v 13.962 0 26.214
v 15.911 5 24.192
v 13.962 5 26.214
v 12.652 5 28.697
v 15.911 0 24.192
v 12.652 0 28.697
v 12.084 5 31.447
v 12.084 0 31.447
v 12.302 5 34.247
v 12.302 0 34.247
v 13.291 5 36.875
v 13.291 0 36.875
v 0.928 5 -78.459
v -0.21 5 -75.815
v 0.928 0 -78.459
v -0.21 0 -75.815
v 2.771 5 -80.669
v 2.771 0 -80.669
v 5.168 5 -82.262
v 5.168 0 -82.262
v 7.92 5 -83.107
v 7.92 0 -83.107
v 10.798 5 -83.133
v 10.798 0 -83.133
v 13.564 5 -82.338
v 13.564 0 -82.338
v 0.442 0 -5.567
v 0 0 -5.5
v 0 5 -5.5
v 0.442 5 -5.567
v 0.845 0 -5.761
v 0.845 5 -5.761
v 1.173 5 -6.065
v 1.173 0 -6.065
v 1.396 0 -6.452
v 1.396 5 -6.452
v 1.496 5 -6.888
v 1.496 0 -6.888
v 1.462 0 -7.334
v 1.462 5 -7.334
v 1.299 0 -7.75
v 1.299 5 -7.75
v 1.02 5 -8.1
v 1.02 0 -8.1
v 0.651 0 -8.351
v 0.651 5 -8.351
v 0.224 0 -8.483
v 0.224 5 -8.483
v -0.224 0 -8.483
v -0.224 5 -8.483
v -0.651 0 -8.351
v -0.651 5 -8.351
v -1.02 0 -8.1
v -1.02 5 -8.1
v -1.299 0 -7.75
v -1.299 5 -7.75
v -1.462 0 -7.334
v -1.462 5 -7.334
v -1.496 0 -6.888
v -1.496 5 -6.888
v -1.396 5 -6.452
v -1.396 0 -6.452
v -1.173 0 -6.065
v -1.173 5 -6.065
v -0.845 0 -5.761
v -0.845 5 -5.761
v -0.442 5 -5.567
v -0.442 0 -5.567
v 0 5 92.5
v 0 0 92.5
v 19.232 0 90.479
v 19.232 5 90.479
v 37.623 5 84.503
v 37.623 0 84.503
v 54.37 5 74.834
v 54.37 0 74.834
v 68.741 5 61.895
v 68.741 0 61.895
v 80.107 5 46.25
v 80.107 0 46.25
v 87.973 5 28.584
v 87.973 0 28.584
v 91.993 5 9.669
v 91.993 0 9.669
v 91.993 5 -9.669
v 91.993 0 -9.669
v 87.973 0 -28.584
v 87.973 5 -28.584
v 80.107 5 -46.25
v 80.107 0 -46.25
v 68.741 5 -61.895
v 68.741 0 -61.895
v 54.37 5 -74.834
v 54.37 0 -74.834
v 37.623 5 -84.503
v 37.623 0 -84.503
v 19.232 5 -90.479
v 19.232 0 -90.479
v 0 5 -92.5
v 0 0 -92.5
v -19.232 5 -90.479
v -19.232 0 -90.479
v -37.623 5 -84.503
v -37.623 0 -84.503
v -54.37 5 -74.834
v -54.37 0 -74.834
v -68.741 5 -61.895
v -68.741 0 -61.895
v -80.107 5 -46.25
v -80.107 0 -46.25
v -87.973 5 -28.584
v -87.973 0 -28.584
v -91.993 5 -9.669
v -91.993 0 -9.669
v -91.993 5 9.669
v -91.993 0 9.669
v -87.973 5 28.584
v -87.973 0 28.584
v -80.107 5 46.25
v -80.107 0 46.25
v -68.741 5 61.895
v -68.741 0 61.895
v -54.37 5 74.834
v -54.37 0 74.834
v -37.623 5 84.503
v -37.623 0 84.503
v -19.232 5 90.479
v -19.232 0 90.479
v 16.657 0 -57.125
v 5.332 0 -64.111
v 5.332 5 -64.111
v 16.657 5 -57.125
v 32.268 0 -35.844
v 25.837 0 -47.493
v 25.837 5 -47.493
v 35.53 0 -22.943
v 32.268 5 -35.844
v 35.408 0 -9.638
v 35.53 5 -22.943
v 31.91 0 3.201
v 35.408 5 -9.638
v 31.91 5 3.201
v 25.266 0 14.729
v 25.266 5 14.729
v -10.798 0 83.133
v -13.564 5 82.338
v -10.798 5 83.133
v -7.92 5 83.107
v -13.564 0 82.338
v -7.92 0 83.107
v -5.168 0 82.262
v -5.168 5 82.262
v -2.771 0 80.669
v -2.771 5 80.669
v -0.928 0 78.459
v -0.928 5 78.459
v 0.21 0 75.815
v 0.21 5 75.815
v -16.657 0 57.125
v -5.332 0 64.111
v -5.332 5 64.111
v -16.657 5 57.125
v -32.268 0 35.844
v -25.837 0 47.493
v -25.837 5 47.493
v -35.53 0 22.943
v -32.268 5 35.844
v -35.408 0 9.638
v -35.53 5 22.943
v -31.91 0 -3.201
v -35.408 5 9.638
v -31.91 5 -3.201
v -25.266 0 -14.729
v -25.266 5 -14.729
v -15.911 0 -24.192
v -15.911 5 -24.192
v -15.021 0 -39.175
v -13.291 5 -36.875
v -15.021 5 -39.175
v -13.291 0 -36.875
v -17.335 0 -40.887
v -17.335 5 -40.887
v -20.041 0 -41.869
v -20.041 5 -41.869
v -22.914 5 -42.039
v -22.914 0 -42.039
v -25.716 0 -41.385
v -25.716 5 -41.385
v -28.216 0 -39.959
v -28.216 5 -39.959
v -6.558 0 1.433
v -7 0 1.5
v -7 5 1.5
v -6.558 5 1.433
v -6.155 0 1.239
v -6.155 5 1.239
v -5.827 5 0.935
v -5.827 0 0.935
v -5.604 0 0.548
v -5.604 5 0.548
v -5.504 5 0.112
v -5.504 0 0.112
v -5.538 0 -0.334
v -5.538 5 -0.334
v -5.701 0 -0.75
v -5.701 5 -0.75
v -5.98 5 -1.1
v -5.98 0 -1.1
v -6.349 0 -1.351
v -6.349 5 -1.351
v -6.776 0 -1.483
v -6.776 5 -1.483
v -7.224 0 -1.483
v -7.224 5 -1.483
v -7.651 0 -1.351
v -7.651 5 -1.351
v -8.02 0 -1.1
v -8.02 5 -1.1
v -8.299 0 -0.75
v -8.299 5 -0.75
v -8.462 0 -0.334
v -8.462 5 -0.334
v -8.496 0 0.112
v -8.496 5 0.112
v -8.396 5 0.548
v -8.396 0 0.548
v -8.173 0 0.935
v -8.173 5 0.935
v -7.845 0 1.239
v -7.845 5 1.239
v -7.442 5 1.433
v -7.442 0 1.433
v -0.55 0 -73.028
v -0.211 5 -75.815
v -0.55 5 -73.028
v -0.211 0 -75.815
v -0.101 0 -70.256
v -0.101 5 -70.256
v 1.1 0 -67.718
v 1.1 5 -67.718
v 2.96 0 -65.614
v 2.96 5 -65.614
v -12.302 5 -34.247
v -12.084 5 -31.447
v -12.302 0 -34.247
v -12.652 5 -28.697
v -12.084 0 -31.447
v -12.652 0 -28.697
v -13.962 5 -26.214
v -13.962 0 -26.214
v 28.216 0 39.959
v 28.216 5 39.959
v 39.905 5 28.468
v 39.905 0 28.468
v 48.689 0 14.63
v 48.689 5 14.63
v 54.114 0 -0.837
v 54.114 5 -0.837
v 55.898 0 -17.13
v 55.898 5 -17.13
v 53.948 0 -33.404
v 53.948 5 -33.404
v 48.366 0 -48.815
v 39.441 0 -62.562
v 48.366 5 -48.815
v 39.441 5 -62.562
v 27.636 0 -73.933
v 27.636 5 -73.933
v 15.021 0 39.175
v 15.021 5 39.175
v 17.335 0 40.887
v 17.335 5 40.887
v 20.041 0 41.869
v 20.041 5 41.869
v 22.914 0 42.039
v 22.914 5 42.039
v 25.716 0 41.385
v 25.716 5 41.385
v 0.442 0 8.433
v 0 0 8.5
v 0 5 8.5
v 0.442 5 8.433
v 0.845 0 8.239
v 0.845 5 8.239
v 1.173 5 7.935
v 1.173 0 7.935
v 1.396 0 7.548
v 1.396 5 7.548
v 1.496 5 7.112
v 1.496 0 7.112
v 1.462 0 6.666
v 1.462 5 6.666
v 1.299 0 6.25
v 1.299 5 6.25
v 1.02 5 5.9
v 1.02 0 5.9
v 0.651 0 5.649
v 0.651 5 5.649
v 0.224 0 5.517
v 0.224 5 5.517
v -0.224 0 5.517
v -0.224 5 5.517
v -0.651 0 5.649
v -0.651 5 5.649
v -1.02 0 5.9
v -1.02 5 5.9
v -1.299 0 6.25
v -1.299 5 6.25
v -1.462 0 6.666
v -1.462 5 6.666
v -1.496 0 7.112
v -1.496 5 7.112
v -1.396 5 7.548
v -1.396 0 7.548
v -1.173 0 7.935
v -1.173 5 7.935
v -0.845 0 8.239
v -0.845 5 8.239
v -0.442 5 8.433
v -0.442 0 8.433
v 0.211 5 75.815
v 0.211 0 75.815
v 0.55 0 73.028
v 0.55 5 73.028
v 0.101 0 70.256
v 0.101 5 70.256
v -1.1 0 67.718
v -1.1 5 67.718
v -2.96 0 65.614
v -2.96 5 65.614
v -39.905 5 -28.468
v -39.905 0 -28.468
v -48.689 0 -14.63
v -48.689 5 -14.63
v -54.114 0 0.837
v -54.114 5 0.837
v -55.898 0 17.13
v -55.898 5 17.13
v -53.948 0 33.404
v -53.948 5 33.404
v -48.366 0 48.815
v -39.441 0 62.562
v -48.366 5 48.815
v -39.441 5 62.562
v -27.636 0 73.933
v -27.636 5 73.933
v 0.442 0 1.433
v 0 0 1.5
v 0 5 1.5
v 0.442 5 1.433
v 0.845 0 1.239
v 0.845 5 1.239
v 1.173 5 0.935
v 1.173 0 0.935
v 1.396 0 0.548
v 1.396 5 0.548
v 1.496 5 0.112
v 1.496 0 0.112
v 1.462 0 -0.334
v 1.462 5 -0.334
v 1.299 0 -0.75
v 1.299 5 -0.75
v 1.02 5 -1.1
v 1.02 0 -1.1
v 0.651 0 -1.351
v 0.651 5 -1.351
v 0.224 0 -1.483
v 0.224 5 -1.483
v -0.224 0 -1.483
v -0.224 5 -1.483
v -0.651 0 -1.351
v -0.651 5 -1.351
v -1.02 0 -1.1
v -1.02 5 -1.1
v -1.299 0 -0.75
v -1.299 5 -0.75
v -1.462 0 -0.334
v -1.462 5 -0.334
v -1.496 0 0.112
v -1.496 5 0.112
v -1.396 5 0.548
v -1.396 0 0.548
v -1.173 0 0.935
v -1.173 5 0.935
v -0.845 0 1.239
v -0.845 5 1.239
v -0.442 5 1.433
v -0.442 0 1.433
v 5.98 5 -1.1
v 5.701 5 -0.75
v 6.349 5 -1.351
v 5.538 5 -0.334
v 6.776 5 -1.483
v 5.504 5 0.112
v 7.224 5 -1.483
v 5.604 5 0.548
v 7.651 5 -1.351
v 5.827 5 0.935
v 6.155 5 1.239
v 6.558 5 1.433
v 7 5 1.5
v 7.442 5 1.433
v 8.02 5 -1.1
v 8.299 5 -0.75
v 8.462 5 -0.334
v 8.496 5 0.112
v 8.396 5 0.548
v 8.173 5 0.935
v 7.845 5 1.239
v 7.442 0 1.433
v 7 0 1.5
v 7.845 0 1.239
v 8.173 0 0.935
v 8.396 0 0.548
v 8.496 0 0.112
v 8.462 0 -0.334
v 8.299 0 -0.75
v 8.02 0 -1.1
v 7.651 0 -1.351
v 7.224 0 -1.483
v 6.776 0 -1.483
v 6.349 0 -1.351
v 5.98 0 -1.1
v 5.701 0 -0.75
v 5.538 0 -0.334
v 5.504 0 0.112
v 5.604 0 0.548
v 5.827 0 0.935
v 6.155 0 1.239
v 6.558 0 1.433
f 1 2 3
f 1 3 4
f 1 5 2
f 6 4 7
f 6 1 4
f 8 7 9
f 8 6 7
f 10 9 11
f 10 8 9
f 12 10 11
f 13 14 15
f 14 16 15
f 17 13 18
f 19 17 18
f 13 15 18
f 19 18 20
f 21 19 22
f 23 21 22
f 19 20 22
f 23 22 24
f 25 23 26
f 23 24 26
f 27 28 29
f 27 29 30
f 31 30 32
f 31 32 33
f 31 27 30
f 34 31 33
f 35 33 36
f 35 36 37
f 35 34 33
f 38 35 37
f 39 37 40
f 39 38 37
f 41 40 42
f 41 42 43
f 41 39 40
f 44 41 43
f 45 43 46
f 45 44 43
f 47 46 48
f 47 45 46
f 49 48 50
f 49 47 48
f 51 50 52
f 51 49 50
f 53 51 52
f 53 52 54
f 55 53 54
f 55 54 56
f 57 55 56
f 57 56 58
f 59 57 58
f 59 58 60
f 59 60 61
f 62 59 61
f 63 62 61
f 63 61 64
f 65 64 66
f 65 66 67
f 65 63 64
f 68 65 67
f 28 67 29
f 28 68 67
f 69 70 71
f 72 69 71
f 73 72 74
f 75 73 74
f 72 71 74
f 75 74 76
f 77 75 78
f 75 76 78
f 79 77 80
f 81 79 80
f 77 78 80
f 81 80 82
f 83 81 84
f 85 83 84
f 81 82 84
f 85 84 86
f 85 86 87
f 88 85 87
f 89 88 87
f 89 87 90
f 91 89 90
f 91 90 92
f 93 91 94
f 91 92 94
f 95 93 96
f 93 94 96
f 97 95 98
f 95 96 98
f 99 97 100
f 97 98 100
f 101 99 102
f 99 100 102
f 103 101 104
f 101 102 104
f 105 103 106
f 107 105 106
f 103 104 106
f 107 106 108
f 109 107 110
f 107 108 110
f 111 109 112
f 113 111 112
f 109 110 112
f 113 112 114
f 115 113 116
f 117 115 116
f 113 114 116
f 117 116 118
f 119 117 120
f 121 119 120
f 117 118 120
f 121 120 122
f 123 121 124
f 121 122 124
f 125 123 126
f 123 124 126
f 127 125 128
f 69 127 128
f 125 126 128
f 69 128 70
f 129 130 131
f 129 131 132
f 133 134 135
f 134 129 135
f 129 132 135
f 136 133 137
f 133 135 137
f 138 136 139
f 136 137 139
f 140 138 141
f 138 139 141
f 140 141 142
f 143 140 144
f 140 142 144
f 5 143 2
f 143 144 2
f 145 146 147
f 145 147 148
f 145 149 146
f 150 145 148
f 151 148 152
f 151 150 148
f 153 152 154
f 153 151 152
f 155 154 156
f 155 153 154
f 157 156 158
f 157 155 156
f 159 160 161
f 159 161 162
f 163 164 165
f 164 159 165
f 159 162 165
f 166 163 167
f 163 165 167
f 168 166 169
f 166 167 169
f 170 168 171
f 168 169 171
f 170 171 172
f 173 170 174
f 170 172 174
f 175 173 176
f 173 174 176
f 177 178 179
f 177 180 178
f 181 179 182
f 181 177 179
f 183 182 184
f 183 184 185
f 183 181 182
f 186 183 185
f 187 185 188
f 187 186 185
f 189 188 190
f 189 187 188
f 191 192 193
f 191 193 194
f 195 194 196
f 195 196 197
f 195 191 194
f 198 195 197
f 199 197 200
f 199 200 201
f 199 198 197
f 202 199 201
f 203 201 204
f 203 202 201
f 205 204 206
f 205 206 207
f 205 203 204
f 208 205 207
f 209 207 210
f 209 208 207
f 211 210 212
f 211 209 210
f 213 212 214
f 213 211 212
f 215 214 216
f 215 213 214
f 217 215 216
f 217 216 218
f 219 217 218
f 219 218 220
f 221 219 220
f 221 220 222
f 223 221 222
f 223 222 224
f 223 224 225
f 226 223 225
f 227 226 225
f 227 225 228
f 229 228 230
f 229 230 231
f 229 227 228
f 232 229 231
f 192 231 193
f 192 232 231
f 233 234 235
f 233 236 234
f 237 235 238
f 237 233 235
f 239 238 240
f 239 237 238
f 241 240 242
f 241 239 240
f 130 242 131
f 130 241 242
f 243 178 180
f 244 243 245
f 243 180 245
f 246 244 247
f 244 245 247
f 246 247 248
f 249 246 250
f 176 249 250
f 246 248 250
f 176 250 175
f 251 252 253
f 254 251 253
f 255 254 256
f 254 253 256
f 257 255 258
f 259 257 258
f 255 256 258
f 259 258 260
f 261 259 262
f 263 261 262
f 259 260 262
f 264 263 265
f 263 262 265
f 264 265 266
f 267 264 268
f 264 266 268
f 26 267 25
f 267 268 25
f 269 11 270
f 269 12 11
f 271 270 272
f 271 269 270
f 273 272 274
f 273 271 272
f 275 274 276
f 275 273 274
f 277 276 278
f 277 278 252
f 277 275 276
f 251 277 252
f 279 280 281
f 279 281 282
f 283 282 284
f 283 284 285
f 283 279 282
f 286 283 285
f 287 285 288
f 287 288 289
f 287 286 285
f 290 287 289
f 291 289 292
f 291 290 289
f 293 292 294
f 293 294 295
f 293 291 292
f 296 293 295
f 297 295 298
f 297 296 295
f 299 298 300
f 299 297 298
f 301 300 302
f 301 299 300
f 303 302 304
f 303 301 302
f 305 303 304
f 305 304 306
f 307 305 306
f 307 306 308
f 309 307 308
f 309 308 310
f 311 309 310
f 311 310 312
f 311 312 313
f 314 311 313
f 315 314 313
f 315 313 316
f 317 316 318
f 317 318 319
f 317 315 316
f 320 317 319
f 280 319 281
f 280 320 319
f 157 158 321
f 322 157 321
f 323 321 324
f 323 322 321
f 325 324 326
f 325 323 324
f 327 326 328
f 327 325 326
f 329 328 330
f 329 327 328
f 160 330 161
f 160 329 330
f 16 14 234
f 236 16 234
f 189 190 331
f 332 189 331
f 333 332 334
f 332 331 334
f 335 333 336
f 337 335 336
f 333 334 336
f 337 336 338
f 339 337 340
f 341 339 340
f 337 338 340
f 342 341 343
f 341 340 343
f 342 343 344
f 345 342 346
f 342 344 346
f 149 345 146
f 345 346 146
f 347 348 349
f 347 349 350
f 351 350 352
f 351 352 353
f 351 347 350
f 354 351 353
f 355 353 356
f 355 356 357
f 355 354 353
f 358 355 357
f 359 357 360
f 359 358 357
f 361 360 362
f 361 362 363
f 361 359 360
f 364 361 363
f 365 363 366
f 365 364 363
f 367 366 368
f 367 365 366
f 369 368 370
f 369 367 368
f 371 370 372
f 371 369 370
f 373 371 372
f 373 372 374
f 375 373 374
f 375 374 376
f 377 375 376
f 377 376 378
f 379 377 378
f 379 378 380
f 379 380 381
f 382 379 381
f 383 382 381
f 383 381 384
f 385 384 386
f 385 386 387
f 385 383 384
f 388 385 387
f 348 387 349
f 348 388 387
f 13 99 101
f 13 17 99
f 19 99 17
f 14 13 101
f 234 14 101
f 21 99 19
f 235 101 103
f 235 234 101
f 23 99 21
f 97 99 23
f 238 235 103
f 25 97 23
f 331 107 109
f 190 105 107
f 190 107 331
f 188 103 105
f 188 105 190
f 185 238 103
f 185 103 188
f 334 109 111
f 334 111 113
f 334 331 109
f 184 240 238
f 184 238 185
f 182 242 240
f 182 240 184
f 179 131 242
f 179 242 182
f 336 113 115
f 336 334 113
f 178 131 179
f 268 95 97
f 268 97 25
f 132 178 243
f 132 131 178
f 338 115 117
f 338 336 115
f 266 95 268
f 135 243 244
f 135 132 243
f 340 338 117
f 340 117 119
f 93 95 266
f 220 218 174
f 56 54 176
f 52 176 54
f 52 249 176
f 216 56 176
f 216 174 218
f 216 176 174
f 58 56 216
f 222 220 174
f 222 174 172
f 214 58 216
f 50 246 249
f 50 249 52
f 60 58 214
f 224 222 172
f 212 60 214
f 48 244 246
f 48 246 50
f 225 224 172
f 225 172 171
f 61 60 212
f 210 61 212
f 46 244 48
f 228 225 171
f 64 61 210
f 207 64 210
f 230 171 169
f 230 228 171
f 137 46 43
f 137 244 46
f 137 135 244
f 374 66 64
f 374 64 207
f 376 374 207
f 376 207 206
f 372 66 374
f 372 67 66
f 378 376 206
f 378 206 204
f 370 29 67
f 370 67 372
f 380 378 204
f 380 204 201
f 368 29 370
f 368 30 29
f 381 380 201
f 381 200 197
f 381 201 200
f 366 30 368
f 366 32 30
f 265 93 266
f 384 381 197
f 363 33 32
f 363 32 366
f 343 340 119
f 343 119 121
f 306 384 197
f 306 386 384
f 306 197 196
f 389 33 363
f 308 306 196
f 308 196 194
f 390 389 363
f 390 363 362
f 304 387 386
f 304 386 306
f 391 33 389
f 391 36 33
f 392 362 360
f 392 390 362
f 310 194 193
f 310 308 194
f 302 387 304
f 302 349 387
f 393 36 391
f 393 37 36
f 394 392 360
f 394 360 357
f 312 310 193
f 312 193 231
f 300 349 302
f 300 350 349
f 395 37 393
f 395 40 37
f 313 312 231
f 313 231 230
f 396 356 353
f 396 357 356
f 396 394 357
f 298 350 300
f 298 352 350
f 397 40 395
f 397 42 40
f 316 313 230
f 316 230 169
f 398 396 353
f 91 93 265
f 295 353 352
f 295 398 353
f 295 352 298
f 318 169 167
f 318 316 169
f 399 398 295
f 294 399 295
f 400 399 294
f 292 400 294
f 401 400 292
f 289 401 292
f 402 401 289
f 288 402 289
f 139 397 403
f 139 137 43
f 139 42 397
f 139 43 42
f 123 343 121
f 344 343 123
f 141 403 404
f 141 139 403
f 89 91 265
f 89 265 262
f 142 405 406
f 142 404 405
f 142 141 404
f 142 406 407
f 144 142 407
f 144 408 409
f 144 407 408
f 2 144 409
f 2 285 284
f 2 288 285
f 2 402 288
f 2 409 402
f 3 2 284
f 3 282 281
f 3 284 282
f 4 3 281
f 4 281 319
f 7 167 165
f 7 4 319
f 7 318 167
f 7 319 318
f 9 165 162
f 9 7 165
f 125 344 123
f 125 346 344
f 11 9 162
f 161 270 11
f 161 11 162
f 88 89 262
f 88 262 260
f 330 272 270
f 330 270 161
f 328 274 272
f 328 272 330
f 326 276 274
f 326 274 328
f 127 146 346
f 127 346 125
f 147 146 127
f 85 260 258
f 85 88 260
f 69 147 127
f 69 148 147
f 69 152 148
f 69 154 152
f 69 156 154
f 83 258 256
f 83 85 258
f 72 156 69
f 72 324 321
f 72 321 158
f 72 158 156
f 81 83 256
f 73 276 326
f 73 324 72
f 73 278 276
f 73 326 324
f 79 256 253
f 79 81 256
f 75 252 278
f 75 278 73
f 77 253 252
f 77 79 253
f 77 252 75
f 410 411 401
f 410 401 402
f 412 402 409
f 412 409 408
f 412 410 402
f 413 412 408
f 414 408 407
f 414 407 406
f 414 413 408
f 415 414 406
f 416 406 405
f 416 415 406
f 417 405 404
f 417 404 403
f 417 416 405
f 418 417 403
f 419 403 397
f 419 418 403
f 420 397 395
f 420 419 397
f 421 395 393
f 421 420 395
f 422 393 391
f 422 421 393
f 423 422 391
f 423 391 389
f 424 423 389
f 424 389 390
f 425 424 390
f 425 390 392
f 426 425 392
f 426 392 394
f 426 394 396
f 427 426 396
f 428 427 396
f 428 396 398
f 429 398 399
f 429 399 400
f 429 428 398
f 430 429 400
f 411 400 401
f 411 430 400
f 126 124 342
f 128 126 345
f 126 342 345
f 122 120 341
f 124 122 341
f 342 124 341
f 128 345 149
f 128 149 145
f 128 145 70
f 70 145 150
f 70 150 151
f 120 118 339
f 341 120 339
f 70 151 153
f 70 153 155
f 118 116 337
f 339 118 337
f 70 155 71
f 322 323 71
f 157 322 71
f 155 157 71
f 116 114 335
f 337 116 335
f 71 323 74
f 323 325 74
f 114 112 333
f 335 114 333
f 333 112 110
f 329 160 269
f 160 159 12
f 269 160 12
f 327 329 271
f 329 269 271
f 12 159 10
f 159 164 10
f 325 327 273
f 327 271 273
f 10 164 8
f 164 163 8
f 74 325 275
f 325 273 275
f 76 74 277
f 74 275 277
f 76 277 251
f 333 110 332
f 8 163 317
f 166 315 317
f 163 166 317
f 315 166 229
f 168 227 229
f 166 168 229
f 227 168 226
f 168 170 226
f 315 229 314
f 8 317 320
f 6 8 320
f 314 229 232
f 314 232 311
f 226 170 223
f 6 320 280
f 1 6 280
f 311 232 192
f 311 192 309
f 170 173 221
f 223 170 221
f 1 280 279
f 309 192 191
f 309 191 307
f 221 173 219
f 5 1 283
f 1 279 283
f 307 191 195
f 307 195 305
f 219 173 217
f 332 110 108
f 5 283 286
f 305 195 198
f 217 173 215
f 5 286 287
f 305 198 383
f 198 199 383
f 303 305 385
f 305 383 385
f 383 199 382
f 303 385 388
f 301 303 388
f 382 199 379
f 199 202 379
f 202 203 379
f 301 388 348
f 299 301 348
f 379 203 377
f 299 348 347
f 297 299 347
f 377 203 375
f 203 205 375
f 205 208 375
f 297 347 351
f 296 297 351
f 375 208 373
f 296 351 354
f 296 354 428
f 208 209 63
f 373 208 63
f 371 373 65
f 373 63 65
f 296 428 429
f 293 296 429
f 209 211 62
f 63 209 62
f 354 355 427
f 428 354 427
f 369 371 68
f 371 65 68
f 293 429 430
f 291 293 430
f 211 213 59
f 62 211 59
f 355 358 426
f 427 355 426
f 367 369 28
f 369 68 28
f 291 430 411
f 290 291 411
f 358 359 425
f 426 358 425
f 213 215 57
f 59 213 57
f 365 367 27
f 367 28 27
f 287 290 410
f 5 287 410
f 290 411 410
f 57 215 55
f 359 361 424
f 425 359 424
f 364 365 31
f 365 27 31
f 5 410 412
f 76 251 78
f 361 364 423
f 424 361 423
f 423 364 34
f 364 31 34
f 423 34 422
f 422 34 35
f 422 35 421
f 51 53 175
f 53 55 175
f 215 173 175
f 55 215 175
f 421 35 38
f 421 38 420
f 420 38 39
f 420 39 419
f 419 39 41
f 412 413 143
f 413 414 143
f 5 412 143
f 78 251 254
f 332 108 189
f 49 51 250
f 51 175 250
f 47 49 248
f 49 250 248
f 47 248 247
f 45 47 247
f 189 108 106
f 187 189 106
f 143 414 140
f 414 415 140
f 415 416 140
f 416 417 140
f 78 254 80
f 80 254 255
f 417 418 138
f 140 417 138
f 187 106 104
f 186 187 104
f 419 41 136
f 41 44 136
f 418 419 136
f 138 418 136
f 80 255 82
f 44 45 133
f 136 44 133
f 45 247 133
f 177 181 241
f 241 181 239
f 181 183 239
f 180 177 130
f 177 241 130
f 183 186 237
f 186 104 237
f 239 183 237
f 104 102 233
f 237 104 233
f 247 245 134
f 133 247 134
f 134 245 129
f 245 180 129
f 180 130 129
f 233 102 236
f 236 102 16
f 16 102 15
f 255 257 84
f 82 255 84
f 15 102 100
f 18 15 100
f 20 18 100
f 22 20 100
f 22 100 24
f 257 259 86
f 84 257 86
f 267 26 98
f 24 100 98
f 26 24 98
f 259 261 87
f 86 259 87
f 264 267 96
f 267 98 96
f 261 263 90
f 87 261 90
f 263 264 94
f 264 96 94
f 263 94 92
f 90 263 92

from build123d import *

# Parameters (mm, degrees)
SKETCH_1_R             = 92.5
SKETCH_1_R_2           = 1.5
EXTRUDE_1_DEPTH        = 5
CUT_EXTRUDE_1_DEPTH    = 30
FILLET_3_R             = 10
SKETCH_1_3_R           = 1.5
EXTRUDE_2_DEPTH        = 5
SKETCH_1_5_OUTSIDE_W   = 239.336
SKETCH_1_5_OUTSIDE_H   = 239.336
SKETCH_1_5_OUTSIDE_R   = 92.5
SKETCH_1_5_OUTSIDE_R_2 = 1.5
CUT_EXTRUDE_2_DEPTH    = 5


with BuildPart() as part:
    # 草图1 → 凸台-拉伸1 (new body)
    with BuildSketch(Plane(origin=(0, 0, 0), x_dir=(1, 0, 0), z_dir=(0, 1, 0))):
        with Locations(Location((0, 0, 0), (0, 0, 270))):
            Circle(SKETCH_1_R)
        with Locations(Location((0, 0, 0), (0, 0, 270))):
            Circle(SKETCH_1_R_2, mode=Mode.SUBTRACT)
        with Locations(Location((0, 7, 0), (0, 0, 270))):
            Circle(SKETCH_1_R_2, mode=Mode.SUBTRACT)
        with Locations(Location((7, 0, 0), (0, 0, 270))):
            Circle(SKETCH_1_R_2, mode=Mode.SUBTRACT)
        with Locations(Location((0, -7, 0), (0, 0, 270))):
            Circle(SKETCH_1_R_2, mode=Mode.SUBTRACT)
        with Locations(Location((-7, 0, 0), (0, 0, 270))):
            Circle(SKETCH_1_R_2, mode=Mode.SUBTRACT)
    extrude(amount=EXTRUDE_1_DEPTH)

    # 草图2 → 切除-拉伸1 (cut)
    with BuildSketch(Plane(origin=(0, 5, 0), x_dir=(1, 0, 0), z_dir=(0, 1, 0))):
        with BuildLine():
            Line((2.591280941, 86.258429639), (-2.591280941, 66.941570361))
            ThreePointArc((-2.591280941, 66.941570361), (35.5302713, 22.943474897), (8.881266501, -28.814767857))
            Line((8.881266501, -28.814767857), (18.480344966, -46.360641806))
            ThreePointArc((18.480344966, -46.360641806), (55.388254532, 25.322655836), (2.591280941, 86.258429639))
        make_face()
        with BuildLine():
            Line((-8.881266501, 28.814767857), (-18.480344966, 46.360641806))
            ThreePointArc((-18.480344966, 46.360641806), (-55.388254532, -25.322655836), (-2.591280941, -86.258429639))
            Line((-2.591280941, -86.258429639), (2.591280941, -66.941570361))
            ThreePointArc((2.591280941, -66.941570361), (-35.5302713, -22.943474897), (-8.881266501, 28.814767857))
        make_face()
    extrude(amount=-CUT_EXTRUDE_1_DEPTH, mode=Mode.SUBTRACT)

    # 圆角3
    fillet_3_edges = [part.edges().sort_by_distance(p)[0] for p in [
        (-18.480344966, 2.5, -46.360641806),
        (-8.881266501, 2.5, -28.814767857),
        (-2.591280941, 2.5, 86.258429639),
        (2.591280941, 2.5, 66.941570361),
        (18.480344966, 2.5, 46.360641806),
        (8.881266501, 2.5, 28.814767857),
        (-2.591280941, 2.5, -66.941570361),
        (2.591280941, 2.5, -86.258429639),
    ]]
    fillet(fillet_3_edges, radius=FILLET_3_R - 0.0001)  # a hair under: the kernel refuses the full size

    # 草图1<3> → 凸台-拉伸2 (add)
    with BuildSketch(Plane(origin=(0, 0, 0), x_dir=(1, 0, 0), z_dir=(0, 1, 0))):
        Circle(SKETCH_1_3_R)
    extrude(amount=EXTRUDE_2_DEPTH)

    # 草图1<5> outside → 切除-拉伸2 (cut)
    # profile 1 of 6: a face of its own
    with BuildSketch(Plane(origin=(0, 0, 0), x_dir=(1, 0, 0), z_dir=(0, 1, 0))):
        Rectangle(SKETCH_1_5_OUTSIDE_W, SKETCH_1_5_OUTSIDE_H)
        with Locations(Location((0, 0, 0), (0, 0, 270))):
            Circle(SKETCH_1_5_OUTSIDE_R, mode=Mode.SUBTRACT)
    # profile 2 of 6: a face of its own
    with BuildSketch(Plane(origin=(0, 0, 0), x_dir=(1, 0, 0), z_dir=(0, 1, 0))):
        with Locations(Location((0, 0, 0), (0, 0, 270))):
            Circle(SKETCH_1_5_OUTSIDE_R_2)
    # profile 3 of 6: a face of its own
    with BuildSketch(Plane(origin=(0, 0, 0), x_dir=(1, 0, 0), z_dir=(0, 1, 0))):
        with Locations(Location((0, 7, 0), (0, 0, 270))):
            Circle(SKETCH_1_5_OUTSIDE_R_2)
    # profile 4 of 6: a face of its own
    with BuildSketch(Plane(origin=(0, 0, 0), x_dir=(1, 0, 0), z_dir=(0, 1, 0))):
        with Locations(Location((7, 0, 0), (0, 0, 270))):
            Circle(SKETCH_1_5_OUTSIDE_R_2)
    # profile 5 of 6: a face of its own
    with BuildSketch(Plane(origin=(0, 0, 0), x_dir=(1, 0, 0), z_dir=(0, 1, 0))):
        with Locations(Location((0, -7, 0), (0, 0, 270))):
            Circle(SKETCH_1_5_OUTSIDE_R_2)
    # profile 6 of 6: a face of its own
    with BuildSketch(Plane(origin=(0, 0, 0), x_dir=(1, 0, 0), z_dir=(0, 1, 0))):
        with Locations(Location((-7, 0, 0), (0, 0, 270))):
            Circle(SKETCH_1_5_OUTSIDE_R_2)
    extrude(amount=CUT_EXTRUDE_2_DEPTH, mode=Mode.SUBTRACT)


solid = part.part
